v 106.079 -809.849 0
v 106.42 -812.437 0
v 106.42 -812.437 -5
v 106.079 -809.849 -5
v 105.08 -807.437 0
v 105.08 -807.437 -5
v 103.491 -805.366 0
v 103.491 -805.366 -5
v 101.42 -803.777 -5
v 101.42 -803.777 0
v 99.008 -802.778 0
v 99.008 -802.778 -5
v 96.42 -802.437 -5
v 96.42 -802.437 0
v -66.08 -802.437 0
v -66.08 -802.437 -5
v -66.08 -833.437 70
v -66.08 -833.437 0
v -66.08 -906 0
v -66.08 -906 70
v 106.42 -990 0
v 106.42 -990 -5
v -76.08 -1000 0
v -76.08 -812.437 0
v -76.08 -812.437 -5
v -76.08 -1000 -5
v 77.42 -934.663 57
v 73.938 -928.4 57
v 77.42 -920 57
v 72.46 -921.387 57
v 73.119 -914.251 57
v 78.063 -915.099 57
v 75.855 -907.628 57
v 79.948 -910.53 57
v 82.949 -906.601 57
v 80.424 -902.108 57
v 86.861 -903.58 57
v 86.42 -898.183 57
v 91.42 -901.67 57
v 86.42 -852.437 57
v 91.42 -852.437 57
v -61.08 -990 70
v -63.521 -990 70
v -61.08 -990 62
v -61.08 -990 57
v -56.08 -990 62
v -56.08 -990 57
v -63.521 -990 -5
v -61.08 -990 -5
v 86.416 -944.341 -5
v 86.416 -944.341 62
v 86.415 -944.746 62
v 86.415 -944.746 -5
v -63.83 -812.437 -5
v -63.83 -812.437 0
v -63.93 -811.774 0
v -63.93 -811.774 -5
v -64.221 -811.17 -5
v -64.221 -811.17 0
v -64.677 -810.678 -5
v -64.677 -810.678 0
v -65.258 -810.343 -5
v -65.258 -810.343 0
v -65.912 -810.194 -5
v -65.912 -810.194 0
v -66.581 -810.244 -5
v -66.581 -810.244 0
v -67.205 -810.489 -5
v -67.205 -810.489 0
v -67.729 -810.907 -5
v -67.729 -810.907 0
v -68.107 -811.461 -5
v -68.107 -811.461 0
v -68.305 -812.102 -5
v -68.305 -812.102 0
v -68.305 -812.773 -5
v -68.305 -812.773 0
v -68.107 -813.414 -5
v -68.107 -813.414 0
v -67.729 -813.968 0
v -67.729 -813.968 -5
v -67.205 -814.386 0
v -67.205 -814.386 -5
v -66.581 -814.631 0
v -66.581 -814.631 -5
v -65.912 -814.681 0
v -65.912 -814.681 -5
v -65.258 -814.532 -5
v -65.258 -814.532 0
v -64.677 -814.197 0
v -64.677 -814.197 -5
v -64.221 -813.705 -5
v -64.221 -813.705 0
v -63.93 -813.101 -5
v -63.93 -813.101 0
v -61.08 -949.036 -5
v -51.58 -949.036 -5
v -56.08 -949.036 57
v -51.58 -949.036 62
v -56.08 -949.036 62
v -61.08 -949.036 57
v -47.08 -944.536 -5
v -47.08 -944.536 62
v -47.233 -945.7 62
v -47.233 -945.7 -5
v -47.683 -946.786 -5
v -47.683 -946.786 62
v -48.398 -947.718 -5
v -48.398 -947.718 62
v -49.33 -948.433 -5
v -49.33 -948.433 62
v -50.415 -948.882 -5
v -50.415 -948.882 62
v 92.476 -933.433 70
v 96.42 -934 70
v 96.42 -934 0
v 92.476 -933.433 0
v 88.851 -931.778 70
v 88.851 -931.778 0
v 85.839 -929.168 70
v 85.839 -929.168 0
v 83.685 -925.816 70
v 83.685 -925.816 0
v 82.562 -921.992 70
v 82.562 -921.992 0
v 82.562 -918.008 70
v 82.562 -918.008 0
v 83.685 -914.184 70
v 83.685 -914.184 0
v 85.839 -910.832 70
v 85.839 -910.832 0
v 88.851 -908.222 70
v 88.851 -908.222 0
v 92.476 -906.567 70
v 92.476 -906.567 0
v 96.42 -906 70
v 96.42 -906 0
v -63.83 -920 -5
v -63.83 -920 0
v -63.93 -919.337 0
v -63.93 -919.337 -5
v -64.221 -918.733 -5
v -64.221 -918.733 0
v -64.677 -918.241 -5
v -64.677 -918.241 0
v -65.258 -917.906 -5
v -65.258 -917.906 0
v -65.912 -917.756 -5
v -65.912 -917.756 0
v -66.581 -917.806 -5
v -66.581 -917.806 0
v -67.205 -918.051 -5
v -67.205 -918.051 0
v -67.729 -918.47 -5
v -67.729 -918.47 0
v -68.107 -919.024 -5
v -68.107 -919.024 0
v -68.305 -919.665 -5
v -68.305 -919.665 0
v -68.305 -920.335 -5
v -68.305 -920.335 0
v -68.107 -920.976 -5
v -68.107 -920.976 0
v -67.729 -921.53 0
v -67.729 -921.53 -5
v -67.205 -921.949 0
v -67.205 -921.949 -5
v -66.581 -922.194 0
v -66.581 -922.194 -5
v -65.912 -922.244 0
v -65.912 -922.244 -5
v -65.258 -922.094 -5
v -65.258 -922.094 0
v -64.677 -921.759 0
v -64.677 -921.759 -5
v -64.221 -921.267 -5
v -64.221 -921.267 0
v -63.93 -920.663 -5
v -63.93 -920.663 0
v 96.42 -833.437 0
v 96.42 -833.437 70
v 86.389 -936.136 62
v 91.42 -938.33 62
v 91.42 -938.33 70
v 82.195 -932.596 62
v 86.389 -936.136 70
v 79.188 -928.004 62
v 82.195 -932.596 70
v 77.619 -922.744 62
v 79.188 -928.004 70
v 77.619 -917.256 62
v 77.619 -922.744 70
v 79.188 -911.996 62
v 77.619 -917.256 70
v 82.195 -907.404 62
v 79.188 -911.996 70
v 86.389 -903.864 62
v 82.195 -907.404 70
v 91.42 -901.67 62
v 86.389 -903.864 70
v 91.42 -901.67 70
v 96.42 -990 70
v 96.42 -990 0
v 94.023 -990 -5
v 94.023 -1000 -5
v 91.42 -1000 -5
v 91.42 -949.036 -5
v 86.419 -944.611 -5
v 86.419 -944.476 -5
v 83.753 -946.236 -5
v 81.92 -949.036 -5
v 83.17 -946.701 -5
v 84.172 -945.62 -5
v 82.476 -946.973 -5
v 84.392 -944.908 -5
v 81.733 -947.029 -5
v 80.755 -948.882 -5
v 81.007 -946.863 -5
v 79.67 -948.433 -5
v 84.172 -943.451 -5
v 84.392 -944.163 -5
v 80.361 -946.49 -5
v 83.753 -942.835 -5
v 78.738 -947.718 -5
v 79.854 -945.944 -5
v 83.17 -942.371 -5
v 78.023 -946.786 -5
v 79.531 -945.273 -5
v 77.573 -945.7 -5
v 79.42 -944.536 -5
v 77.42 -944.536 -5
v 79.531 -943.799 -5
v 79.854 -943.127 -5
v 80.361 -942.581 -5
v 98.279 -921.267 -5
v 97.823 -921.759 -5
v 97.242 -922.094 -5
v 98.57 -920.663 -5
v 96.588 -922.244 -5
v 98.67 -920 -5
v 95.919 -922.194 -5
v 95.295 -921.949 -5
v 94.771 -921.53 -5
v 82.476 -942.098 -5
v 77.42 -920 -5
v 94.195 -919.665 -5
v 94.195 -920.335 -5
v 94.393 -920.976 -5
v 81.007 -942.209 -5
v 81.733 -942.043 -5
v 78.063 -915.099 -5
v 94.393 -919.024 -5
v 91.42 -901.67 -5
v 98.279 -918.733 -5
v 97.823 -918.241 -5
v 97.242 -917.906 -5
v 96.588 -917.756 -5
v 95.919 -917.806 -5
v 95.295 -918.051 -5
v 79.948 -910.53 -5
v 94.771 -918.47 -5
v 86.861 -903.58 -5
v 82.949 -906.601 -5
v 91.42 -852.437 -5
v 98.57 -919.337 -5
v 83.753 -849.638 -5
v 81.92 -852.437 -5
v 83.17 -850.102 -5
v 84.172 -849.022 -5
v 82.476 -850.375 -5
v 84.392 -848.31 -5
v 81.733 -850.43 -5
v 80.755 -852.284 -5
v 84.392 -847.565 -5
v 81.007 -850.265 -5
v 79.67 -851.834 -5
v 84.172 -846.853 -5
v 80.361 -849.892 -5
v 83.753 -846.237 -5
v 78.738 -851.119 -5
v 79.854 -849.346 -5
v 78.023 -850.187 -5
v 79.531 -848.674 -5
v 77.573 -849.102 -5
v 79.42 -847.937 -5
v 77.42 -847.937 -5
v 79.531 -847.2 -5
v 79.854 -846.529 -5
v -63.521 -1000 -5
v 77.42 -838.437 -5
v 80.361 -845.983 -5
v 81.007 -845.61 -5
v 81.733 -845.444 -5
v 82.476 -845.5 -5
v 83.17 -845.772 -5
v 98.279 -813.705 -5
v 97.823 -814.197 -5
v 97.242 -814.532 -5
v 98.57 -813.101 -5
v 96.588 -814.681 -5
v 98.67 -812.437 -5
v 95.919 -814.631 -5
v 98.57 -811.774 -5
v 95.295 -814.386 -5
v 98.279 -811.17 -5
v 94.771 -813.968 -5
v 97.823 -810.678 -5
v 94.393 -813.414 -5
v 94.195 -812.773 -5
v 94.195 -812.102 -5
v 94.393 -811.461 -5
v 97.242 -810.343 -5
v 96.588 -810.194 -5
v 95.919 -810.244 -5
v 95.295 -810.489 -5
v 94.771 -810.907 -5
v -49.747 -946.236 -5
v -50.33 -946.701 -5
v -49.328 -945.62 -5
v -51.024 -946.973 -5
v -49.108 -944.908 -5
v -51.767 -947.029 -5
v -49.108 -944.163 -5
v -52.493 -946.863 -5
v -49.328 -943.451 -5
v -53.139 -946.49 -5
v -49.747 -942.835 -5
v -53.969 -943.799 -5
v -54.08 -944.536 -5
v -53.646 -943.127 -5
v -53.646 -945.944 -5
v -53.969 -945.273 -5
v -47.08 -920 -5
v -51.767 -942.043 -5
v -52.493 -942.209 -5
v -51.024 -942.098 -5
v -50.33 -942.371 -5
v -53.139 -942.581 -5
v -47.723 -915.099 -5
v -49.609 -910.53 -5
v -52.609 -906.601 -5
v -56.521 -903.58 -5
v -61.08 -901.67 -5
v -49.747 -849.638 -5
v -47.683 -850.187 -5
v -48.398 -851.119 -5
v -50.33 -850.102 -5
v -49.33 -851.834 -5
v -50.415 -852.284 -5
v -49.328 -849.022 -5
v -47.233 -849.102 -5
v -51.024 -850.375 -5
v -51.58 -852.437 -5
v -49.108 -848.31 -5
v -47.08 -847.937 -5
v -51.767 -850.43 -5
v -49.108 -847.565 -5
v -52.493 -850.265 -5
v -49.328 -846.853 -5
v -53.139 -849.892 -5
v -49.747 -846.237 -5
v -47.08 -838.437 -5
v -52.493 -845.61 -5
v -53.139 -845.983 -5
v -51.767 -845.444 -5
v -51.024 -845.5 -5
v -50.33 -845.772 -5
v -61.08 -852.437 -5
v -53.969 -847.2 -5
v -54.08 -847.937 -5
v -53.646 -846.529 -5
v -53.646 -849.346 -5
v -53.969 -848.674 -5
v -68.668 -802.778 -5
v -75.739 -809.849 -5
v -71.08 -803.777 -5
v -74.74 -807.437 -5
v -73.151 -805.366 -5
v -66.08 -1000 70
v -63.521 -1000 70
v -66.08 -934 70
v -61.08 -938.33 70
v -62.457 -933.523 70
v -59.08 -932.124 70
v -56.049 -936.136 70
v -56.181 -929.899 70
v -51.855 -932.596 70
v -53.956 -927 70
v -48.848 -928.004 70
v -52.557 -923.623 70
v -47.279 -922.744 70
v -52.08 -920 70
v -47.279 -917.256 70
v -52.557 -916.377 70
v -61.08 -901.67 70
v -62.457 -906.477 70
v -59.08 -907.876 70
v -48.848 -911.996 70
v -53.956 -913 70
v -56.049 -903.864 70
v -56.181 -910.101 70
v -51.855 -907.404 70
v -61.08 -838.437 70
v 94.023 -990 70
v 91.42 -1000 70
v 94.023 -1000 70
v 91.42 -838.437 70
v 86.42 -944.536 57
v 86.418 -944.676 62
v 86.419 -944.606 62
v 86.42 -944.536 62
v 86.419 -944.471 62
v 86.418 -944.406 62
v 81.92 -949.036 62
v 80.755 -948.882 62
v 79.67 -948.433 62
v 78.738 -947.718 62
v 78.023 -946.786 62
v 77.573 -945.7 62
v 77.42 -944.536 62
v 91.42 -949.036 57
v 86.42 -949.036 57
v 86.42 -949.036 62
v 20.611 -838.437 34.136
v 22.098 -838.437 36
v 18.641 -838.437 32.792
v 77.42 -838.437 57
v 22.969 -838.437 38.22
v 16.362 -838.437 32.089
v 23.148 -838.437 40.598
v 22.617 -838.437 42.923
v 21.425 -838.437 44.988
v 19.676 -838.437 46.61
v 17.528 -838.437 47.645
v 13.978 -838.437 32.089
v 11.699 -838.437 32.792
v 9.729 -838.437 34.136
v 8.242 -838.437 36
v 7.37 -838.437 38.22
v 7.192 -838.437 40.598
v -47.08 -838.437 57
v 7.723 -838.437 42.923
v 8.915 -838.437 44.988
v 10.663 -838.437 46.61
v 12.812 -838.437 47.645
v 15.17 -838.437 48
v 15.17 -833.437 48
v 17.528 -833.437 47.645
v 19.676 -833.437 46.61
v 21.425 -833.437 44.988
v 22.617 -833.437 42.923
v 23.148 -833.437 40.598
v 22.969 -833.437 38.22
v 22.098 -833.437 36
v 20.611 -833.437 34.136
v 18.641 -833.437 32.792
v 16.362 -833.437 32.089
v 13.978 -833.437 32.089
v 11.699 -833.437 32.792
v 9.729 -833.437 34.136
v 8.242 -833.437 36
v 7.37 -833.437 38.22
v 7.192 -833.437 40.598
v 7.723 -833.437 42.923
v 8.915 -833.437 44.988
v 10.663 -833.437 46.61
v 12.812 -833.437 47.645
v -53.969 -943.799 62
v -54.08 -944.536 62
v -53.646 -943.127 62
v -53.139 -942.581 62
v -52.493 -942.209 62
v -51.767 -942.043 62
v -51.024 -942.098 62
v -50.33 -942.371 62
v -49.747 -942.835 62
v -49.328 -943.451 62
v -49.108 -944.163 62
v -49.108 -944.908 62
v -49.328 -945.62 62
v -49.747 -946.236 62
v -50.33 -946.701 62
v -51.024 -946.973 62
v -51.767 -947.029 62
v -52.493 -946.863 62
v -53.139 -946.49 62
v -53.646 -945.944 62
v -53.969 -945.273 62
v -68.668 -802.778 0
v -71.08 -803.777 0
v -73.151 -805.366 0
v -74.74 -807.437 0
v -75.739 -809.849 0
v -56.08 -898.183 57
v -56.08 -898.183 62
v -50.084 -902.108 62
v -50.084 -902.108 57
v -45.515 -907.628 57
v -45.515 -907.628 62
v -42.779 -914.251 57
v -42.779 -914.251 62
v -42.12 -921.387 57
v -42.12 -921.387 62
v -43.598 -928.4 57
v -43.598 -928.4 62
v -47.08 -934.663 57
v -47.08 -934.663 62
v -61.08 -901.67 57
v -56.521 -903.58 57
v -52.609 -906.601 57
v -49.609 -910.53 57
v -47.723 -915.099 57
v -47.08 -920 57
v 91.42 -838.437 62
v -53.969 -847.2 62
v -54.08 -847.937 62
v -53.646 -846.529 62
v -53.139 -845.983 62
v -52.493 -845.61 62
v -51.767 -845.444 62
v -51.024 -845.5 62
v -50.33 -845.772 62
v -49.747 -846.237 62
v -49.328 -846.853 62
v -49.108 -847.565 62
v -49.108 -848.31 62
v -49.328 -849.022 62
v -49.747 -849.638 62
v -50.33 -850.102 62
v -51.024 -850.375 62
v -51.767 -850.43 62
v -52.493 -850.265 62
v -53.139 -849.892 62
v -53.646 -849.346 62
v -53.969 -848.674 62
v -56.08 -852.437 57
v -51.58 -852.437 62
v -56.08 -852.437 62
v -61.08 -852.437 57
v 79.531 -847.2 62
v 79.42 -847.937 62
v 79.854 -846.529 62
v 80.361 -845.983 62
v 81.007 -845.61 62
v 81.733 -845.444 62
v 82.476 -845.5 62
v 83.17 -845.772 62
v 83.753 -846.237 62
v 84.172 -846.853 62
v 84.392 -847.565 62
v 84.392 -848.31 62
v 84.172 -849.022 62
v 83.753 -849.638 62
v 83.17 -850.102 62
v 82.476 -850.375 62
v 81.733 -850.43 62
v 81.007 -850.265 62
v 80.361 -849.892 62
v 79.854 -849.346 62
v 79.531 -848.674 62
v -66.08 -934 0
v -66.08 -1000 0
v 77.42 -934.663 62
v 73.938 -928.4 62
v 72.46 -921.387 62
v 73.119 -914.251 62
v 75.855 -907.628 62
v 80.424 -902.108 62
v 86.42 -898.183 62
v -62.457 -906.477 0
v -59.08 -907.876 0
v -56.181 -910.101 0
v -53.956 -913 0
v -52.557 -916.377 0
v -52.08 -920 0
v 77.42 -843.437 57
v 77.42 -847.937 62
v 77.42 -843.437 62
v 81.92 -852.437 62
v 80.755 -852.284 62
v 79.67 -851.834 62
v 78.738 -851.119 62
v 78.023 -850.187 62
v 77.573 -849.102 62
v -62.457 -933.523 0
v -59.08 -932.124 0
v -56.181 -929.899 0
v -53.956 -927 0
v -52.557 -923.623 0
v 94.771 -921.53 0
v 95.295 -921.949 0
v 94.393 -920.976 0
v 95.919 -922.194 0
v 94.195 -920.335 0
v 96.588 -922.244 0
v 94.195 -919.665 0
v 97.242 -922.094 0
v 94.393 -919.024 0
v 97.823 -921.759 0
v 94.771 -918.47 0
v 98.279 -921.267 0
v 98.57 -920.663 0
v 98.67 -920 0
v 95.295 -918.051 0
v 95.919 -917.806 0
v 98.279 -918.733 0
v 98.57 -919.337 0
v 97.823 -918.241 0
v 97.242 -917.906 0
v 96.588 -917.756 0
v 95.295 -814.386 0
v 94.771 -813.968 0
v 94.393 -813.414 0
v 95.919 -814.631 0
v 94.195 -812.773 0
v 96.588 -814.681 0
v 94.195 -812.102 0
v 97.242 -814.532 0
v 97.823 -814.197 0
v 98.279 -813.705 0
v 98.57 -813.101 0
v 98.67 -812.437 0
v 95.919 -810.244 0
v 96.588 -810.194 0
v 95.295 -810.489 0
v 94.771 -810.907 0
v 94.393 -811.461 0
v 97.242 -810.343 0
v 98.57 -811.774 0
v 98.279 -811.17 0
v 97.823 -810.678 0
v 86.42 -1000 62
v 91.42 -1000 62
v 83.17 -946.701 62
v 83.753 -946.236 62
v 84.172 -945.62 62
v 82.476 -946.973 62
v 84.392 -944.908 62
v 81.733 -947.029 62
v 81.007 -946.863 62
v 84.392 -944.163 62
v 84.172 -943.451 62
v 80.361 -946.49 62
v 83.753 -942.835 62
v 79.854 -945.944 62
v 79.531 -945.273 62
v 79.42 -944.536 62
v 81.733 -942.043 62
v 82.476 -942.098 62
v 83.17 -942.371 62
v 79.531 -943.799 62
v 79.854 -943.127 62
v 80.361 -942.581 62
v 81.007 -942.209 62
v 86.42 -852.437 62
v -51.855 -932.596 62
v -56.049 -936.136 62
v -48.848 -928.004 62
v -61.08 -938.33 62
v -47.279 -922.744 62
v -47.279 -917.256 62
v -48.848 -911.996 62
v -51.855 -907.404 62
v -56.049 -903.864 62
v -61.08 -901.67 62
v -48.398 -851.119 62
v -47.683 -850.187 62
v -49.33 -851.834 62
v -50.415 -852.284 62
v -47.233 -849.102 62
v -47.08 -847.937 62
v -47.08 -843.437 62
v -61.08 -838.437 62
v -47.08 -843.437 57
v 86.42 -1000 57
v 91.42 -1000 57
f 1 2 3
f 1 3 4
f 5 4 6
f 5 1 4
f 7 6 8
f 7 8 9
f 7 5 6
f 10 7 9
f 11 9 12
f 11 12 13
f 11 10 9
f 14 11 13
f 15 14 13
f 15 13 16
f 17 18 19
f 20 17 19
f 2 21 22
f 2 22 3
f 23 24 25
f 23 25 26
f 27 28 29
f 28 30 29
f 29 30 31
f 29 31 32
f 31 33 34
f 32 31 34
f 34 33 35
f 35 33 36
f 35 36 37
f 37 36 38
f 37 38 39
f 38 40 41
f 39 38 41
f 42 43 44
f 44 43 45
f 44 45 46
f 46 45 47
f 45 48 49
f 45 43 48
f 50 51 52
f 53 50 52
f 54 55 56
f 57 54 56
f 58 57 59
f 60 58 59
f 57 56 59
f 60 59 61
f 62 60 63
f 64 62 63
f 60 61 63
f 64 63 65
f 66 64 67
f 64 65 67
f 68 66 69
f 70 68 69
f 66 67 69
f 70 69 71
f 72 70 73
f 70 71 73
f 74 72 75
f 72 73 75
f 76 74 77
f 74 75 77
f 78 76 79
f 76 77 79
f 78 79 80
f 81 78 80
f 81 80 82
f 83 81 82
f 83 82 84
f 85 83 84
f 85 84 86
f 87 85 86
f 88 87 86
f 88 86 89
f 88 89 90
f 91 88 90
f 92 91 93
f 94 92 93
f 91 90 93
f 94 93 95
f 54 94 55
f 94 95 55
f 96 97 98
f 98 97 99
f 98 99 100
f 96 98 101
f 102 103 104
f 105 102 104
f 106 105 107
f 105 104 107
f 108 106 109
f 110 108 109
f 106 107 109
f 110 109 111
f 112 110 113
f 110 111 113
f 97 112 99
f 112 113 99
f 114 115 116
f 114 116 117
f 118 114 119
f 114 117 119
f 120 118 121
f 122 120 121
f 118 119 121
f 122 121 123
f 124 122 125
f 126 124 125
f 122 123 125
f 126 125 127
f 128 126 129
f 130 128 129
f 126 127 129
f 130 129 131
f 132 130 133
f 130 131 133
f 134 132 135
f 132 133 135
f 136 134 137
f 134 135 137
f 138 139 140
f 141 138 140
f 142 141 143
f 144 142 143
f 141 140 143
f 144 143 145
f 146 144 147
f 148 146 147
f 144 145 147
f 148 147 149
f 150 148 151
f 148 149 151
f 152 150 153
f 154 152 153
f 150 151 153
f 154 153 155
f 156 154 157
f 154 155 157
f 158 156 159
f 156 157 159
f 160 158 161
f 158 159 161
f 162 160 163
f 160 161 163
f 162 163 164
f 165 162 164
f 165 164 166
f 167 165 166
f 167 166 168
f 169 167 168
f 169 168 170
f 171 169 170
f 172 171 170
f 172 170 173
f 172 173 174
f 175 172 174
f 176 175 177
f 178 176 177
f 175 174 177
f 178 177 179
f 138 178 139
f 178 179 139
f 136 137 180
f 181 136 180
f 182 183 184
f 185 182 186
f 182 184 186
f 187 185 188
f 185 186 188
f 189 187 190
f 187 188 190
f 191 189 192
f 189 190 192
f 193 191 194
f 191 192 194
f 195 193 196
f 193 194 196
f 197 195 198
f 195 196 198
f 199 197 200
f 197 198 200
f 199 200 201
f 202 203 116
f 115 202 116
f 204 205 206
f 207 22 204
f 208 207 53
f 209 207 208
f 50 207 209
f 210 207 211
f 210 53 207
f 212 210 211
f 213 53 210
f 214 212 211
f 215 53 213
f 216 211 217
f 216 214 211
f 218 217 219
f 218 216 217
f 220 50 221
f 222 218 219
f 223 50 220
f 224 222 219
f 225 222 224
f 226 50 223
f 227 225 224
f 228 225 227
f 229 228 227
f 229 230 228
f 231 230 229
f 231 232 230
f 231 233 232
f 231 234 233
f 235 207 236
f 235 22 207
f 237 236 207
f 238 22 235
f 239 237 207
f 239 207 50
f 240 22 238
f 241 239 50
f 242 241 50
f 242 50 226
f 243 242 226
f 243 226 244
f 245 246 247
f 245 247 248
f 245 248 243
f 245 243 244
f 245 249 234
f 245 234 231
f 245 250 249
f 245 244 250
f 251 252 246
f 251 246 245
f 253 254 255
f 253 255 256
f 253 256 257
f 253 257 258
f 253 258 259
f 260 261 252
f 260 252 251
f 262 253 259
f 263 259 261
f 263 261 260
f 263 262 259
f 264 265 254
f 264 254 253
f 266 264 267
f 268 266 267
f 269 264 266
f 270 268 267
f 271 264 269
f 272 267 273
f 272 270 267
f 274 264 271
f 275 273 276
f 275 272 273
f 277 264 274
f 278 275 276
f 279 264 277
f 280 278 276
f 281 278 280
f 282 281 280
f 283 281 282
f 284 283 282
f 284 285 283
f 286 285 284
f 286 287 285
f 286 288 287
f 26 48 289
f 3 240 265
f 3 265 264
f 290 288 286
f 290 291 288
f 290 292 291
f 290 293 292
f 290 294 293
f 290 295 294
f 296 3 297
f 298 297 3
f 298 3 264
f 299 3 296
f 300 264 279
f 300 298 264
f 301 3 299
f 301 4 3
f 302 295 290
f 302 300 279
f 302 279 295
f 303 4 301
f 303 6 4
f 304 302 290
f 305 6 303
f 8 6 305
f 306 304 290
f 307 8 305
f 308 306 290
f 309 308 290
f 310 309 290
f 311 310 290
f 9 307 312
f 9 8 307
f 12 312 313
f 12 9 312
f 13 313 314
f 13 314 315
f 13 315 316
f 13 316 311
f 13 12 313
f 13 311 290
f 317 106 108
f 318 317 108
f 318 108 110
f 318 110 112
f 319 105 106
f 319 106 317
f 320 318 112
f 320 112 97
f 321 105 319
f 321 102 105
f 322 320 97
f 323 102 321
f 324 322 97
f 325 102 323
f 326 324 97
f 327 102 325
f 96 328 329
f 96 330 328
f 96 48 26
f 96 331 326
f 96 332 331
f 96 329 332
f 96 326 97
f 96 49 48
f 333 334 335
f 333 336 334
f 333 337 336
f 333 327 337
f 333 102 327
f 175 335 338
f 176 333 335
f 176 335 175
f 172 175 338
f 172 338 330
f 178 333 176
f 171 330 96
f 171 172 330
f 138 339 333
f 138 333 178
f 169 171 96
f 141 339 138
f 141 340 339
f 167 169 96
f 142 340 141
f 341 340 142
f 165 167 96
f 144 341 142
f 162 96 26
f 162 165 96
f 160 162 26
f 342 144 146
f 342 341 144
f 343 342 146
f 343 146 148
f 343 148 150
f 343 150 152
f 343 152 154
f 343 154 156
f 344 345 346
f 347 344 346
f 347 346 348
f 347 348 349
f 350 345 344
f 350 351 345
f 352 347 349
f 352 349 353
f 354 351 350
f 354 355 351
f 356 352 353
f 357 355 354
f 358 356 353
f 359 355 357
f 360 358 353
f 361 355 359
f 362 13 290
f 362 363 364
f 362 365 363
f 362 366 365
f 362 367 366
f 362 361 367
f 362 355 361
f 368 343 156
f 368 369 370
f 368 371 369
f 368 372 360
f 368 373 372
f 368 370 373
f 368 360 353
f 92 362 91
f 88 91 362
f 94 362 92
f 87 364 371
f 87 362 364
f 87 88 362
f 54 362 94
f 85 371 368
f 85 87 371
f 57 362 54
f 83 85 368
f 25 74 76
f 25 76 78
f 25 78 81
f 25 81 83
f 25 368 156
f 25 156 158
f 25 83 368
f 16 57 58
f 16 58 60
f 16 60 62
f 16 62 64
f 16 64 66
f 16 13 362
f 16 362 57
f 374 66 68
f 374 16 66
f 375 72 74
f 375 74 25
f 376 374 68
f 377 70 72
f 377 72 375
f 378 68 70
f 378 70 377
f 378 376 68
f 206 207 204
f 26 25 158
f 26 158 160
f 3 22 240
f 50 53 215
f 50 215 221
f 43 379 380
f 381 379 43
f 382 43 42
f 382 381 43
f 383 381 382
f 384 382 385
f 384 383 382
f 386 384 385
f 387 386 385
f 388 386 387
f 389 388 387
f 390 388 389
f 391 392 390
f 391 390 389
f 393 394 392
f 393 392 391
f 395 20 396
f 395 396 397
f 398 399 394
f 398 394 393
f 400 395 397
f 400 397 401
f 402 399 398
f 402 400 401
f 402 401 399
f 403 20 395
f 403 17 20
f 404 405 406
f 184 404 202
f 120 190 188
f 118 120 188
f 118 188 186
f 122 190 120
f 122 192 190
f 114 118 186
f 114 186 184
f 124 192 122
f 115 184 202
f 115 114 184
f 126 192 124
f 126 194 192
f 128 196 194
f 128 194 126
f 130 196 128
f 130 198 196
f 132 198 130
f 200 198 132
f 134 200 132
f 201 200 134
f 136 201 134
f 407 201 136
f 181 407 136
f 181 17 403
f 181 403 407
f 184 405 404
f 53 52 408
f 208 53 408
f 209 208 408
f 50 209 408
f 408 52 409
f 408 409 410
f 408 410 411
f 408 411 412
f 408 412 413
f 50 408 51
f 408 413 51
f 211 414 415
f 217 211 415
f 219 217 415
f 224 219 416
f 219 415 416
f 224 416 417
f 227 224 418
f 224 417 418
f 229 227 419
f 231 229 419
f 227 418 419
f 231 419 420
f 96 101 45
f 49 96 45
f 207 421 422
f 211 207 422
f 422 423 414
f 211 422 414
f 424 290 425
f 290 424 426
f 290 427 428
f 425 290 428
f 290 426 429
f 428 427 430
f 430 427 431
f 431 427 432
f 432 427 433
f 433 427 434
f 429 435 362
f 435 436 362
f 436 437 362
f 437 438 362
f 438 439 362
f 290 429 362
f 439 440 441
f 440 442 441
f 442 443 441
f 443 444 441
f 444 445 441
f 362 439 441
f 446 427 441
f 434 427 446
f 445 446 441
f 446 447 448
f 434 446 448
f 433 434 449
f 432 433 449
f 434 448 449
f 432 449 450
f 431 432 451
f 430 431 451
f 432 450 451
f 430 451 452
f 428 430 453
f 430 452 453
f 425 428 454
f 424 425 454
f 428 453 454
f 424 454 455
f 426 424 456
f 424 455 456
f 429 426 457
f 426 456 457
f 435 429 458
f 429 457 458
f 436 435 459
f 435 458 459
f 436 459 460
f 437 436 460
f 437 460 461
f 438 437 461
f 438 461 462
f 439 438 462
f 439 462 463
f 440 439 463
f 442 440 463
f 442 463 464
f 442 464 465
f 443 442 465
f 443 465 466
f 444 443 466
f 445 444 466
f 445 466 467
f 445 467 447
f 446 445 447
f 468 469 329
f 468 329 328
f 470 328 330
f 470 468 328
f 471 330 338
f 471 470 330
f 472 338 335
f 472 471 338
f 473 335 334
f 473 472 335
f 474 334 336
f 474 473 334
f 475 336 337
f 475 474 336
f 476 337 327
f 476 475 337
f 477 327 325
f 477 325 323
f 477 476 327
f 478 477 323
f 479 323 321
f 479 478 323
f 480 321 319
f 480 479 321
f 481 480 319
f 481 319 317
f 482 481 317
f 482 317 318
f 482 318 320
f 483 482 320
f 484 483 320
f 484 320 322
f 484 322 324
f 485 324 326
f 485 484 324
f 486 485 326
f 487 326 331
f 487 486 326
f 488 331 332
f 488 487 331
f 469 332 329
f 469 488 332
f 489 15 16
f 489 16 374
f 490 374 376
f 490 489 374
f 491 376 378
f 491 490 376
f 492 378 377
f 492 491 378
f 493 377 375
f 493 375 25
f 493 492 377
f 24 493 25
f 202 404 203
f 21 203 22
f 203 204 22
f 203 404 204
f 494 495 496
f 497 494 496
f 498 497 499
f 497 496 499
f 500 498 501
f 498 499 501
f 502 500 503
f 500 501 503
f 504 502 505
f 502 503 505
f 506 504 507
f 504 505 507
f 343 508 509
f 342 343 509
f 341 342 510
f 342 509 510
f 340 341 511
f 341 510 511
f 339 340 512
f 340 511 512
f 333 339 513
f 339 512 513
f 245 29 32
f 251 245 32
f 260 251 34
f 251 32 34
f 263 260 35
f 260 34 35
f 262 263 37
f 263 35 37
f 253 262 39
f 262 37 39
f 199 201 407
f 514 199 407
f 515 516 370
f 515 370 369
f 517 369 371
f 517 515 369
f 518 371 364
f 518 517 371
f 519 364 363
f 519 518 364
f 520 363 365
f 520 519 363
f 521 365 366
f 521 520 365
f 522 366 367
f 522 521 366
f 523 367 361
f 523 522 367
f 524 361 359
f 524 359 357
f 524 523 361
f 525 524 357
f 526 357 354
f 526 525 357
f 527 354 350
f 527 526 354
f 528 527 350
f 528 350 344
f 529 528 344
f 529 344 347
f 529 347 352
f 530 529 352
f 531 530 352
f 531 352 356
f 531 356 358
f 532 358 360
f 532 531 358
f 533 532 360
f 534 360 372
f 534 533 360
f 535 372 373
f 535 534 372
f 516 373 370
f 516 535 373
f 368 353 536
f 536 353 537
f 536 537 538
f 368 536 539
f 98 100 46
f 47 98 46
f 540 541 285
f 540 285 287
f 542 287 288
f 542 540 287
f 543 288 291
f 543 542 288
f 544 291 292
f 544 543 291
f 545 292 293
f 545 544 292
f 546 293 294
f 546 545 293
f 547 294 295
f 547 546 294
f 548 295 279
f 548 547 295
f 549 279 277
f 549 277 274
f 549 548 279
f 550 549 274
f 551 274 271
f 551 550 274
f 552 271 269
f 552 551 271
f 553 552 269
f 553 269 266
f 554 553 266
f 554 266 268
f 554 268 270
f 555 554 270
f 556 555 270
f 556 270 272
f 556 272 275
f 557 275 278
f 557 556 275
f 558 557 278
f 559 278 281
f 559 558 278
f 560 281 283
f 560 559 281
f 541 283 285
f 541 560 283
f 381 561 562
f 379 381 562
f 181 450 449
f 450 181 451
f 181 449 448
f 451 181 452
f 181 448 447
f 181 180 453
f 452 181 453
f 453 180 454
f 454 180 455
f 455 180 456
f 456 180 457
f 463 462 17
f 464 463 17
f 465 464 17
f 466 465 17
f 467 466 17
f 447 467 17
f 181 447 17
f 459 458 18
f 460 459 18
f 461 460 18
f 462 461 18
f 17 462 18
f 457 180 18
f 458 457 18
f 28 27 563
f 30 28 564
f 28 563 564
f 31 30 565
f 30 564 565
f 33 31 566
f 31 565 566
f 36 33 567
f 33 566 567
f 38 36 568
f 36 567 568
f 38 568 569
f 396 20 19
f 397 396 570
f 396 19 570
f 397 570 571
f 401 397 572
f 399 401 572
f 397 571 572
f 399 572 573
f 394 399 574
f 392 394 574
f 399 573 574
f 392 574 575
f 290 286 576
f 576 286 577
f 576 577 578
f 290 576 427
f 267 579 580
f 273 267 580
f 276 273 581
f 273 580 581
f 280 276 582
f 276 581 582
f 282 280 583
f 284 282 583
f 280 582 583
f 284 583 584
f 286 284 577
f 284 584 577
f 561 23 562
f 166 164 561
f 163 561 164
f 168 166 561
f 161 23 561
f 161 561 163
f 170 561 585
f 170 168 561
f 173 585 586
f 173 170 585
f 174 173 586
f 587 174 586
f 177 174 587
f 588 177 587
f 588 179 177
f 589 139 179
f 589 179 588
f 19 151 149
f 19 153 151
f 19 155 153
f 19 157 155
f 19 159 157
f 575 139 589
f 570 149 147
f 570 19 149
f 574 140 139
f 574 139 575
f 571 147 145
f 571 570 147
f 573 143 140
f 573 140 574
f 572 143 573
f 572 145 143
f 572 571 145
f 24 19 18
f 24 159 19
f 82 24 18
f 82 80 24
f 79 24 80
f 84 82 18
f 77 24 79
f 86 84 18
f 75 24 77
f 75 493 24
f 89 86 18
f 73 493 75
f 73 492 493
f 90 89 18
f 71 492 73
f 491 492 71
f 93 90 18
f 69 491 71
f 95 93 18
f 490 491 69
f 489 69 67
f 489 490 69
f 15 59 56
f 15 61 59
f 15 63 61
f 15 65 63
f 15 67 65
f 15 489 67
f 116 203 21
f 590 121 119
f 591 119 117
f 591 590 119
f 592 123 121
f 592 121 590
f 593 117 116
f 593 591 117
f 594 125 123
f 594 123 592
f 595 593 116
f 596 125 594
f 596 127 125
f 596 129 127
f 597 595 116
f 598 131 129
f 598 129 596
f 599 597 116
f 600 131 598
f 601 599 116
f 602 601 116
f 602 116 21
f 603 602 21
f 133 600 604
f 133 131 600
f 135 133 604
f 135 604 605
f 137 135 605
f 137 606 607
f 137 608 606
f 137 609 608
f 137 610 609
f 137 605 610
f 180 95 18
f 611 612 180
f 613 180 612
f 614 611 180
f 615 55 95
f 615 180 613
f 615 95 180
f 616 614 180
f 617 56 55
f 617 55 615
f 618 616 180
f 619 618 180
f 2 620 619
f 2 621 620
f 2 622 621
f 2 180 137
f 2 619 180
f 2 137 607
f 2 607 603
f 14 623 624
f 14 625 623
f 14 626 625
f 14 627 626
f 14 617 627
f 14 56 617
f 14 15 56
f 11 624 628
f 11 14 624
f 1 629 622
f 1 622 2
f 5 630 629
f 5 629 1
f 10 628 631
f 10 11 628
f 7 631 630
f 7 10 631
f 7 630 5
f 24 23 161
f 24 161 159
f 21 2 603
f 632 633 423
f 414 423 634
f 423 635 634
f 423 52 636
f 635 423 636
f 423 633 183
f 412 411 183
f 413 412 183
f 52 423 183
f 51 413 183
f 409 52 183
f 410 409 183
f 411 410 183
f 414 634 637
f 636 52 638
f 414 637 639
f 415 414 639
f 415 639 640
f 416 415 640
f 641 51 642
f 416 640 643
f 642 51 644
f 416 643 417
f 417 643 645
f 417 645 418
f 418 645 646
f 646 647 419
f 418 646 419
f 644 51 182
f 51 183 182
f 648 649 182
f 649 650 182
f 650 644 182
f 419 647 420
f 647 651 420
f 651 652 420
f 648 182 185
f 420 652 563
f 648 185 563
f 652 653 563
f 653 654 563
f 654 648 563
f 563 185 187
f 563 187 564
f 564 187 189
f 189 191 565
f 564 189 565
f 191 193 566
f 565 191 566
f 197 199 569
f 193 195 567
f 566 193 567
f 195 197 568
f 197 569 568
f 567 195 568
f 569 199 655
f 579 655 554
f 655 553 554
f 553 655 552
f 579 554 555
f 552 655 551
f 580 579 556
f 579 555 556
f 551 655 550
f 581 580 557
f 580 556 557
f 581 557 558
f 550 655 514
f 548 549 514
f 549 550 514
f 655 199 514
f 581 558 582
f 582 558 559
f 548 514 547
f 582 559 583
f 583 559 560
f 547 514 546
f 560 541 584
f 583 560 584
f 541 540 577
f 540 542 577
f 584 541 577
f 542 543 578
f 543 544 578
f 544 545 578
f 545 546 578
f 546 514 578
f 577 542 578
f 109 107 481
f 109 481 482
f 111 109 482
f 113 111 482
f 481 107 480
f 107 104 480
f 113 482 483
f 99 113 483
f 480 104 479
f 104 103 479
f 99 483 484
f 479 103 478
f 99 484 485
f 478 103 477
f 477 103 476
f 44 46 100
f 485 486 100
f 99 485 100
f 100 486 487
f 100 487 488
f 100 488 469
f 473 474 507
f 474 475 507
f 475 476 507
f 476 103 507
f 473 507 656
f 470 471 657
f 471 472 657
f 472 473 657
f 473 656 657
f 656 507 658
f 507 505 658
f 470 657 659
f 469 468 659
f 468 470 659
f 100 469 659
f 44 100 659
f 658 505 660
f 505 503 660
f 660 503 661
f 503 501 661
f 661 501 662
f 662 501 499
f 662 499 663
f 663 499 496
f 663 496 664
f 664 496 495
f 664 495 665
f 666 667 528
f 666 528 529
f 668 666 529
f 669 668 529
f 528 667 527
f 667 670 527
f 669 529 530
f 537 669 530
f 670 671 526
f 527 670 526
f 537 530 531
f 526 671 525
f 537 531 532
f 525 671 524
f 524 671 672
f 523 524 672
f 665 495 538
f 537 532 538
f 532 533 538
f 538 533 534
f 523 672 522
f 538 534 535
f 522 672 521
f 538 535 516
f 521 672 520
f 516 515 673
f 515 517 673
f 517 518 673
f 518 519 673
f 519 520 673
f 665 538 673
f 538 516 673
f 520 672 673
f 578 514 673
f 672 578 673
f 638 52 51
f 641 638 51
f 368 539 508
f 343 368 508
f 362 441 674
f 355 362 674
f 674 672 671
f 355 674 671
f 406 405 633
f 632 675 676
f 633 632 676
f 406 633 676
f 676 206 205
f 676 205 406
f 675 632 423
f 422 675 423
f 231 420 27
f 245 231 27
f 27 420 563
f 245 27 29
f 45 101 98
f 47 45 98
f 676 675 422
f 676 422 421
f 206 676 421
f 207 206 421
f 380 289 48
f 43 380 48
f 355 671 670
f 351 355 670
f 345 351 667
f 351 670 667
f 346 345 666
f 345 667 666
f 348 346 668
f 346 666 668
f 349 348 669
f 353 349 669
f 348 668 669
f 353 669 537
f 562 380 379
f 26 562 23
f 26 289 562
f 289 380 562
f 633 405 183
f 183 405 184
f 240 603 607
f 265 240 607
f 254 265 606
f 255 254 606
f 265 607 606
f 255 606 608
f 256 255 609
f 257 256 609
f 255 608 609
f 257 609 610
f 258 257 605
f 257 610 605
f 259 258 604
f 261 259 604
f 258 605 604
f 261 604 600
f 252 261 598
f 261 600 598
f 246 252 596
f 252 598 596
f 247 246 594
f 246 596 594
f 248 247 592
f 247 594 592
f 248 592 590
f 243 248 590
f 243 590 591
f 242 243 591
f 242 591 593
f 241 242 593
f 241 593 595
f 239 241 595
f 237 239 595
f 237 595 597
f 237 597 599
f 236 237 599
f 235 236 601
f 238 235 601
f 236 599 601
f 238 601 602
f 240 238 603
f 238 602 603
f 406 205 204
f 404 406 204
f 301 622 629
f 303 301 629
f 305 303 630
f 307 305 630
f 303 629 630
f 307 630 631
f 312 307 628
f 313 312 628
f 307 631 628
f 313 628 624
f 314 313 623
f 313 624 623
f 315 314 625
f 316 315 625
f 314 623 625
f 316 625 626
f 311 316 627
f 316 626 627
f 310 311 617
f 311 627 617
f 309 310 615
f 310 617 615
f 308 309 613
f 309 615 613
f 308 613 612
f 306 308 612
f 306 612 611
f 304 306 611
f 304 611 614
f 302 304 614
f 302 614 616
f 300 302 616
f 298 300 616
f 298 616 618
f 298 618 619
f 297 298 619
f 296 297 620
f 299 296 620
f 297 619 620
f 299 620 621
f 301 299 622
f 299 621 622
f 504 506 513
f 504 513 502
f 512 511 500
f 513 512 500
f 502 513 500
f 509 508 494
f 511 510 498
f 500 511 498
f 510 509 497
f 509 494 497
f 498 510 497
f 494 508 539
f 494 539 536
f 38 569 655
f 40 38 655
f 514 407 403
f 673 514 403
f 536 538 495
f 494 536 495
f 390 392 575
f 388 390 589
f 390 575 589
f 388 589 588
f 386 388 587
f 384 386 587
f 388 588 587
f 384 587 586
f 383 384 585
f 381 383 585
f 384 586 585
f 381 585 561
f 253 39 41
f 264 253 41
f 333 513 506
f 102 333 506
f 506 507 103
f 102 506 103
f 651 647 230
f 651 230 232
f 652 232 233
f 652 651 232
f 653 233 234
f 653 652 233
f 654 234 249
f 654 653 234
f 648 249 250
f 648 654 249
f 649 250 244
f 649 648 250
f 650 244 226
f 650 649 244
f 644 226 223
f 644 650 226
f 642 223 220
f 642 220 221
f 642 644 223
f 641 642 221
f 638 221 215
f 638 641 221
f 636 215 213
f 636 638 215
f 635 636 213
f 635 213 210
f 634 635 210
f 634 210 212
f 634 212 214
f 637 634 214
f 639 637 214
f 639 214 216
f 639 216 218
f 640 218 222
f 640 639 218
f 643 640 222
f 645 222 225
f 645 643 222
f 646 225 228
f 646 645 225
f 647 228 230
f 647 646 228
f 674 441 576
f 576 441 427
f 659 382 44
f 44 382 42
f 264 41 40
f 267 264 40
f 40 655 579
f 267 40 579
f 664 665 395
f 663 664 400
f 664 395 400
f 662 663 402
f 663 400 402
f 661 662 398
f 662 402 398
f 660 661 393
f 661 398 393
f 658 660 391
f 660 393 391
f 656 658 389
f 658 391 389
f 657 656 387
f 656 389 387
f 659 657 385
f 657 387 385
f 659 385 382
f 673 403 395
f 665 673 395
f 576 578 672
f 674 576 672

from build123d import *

# Parameters (mm, degrees)
SKETCH1_R               = 2.25
SKETCH1_R_2             = 7.9375
BOSS_EXTRUDE1_DEPTH     = 5
BOSS_EXTRUDE2_DEPTH     = 70
SKETCH3_R               = 8
CUT_EXTRUDE1_DEPTH      = 391.651691136
CUT_EXTRUDE2_DEPTH      = 1209.654326614
SKETCH5_R               = 7.9375
CUT_EXTRUDE3_DEPTH      = 1209.654326614
BOSS_EXTRUDE4_DEPTH     = 5
BOSS_EXTRUDE5_START     = -67
BOSS_EXTRUDE5_OUTLINE_R = 2.5
BOSS_EXTRUDE5_DEPTH     = 67
CUT_EXTRUDE4_DEPTH      = 1209.654326614
CUT_EXTRUDE4_DEPTH_BACK = 1209.654326614
CUT_EXTRUDE5_DEPTH      = 1009.510065127


# Read off the part's stored shape, not the designer's step: Boss-Extrude5
with BuildPart() as part:
    # Sketch1 → Boss-Extrude1 (new body)
    with BuildSketch(Plane.XY):
        with BuildLine():
            Line((-66.080112923, -1201.56262), (96.419887077, -1201.56262))
            ThreePointArc((96.419887077, -1201.56262), (106.319382013, -1197.462114937), (110.419887077, -1187.56262))
            Line((110.419887077, -1187.56262), (110.419887077, -812.43738))
            ThreePointArc((110.419887077, -812.43738), (106.319382013, -802.537885063), (96.419887077, -798.43738))
            Line((96.419887077, -798.43738), (-66.080112923, -798.43738))
            ThreePointArc((-66.080112923, -798.43738), (-75.97960786, -802.537885063), (-80.080112923, -812.43738))
            Line((-80.080112923, -812.43738), (-80.080112923, -1187.56262))
            ThreePointArc((-80.080112923, -1187.56262), (-75.97960786, -1197.462114937), (-66.080112923, -1201.56262))
        make_face()
        with Locations((96.419887077, -1080)):
            Circle(SKETCH1_R, mode=Mode.SUBTRACT)
        with Locations((88.147808187, -1029.0799835)):
            Circle(SKETCH1_R_2, mode=Mode.SUBTRACT)
        with Locations((-66.080112923, -1080)):
            Circle(SKETCH1_R, mode=Mode.SUBTRACT)
        with Locations((96.419887077, -920)):
            Circle(SKETCH1_R, mode=Mode.SUBTRACT)
        with Locations((-66.080112923, -920)):
            Circle(SKETCH1_R, mode=Mode.SUBTRACT)
        with Locations((-66.080112923, -1187.56262)):
            Circle(SKETCH1_R, mode=Mode.SUBTRACT)
        with Locations((96.419887077, -1187.56262)):
            Circle(SKETCH1_R, mode=Mode.SUBTRACT)
        with Locations((-66.080112923, -812.43738)):
            Circle(SKETCH1_R, mode=Mode.SUBTRACT)
        with Locations((96.419887077, -812.43738)):
            Circle(SKETCH1_R, mode=Mode.SUBTRACT)
    extrude(amount=-BOSS_EXTRUDE1_DEPTH)

    # Sketch2 → Boss-Extrude2 (add)
    with BuildSketch(Plane.XY):
        with BuildLine():
            Line((91.419887077, -1166.56262), (96.419887077, -1166.56262))
            Line((96.419887077, -1166.56262), (96.419887077, -1099))
            Line((96.419887077, -1099), (96.419887077, -1094))
            ThreePointArc((96.419887077, -1094), (82.419887077, -1080), (96.419887077, -1066))
            Line((96.419887077, -1066), (96.419887077, -1061))
            Line((96.419887077, -1061), (96.419887077, -1044.996221029))
            ThreePointArc((96.419887077, -1044.996221029), (106.085308187, -1029.0799835), (96.419887077, -1013.163745971))
            Line((96.419887077, -1013.163745971), (96.419887077, -939))
            Line((96.419887077, -939), (96.419887077, -934))
            ThreePointArc((96.419887077, -934), (82.419887077, -920), (96.419887077, -906))
            Line((96.419887077, -906), (96.419887077, -901))
            Line((96.419887077, -901), (96.419887077, -833.43738))
            Line((96.419887077, -833.43738), (91.419887077, -833.43738))
            Line((91.419887077, -833.43738), (-61.080112923, -833.43738))
            Line((-61.080112923, -833.43738), (-66.080112923, -833.43738))
            Line((-66.080112923, -833.43738), (-66.080112923, -901))
            Line((-66.080112923, -901), (-66.080112923, -906))
            ThreePointArc((-66.080112923, -906), (-56.180617987, -910.100505063), (-52.080112923, -920))
            ThreePointArc((-52.080112923, -920), (-56.180617987, -929.899494937), (-66.080112923, -934))
            Line((-66.080112923, -934), (-66.080112923, -939))
            Line((-66.080112923, -939), (-66.080112923, -1061))
            Line((-66.080112923, -1061), (-66.080112923, -1066))
            ThreePointArc((-66.080112923, -1066), (-56.180617987, -1070.100505063), (-52.080112923, -1080))
            ThreePointArc((-52.080112923, -1080), (-56.180617987, -1089.899494937), (-66.080112923, -1094))
            Line((-66.080112923, -1094), (-66.080112923, -1099))
            Line((-66.080112923, -1099), (-66.080112923, -1166.56262))
            Line((-66.080112923, -1166.56262), (-61.080112923, -1166.56262))
            Line((-61.080112923, -1166.56262), (91.419887077, -1166.56262))
        make_face()
        with BuildLine():
            Line((91.419887077, -1098.33030278), (91.419887077, -1161.56262))
            Line((91.419887077, -1161.56262), (-61.080112923, -1161.56262))
            Line((-61.080112923, -1161.56262), (-61.080112923, -1098.33030278))
            ThreePointArc((-61.080112923, -1098.33030278), (-47.080112923, -1080), (-61.080112923, -1061.66969722))
            Line((-61.080112923, -1061.66969722), (-61.080112923, -938.33030278))
            ThreePointArc((-61.080112923, -938.33030278), (-47.080112923, -920), (-61.080112923, -901.66969722))
            Line((-61.080112923, -901.66969722), (-61.080112923, -838.43738))
            Line((-61.080112923, -838.43738), (91.419887077, -838.43738))
            Line((91.419887077, -838.43738), (91.419887077, -901.66969722))
            ThreePointArc((91.419887077, -901.66969722), (77.419887077, -920), (91.419887077, -938.33030278))
            Line((91.419887077, -938.33030278), (91.419887077, -1011.443447389))
            Line((91.419887077, -1011.443447389), (91.419887077, -1016.563098664))
            ThreePointArc((91.419887077, -1016.563098664), (94.061132369, -1017.572963757), (96.419887077, -1019.132540759))
            ThreePointArc((96.419887077, -1019.132540759), (99.861025654, -1023.586401535), (101.085308187, -1029.0799835))
            ThreePointArc((101.085308187, -1029.0799835), (99.861025654, -1034.573565465), (96.419887077, -1039.027426241))
            ThreePointArc((96.419887077, -1039.027426241), (94.061132369, -1040.587003243), (91.419887077, -1041.596868336))
            Line((91.419887077, -1041.596868336), (91.419887077, -1046.716519611))
            Line((91.419887077, -1046.716519611), (91.419887077, -1061.66969722))
            ThreePointArc((91.419887077, -1061.66969722), (77.419887077, -1080), (91.419887077, -1098.33030278))
        make_face(mode=Mode.SUBTRACT)
    extrude(amount=BOSS_EXTRUDE2_DEPTH)

    # Sketch3 → Cut-Extrude1 (cut, through all)
    with BuildSketch(Plane(origin=(0, -833.43738, 0), x_dir=(1, 0, 0), z_dir=(0, 1, 0))):
        with Locations(Location((15.169887077, -40, 0), (0, 0, 270))):
            Circle(SKETCH3_R)
    extrude(amount=-CUT_EXTRUDE1_DEPTH, mode=Mode.SUBTRACT)

    # Sketch4 → Cut-Extrude2 (cut, through all)
    with BuildSketch(Plane.XY):
        with BuildLine():
            Line((-61.080112923, -1161.56262), (91.419887077, -1161.56262))
            Line((91.419887077, -1161.56262), (91.419887077, -1098.33030278))
            ThreePointArc((91.419887077, -1098.33030278), (77.419887077, -1080), (91.419887077, -1061.66969722))
            Line((91.419887077, -1061.66969722), (91.419887077, -1046.716519611))
            ThreePointArc((91.419887077, -1046.716519611), (70.210308187, -1029.0799835), (91.419887077, -1011.443447389))
            Line((91.419887077, -1011.443447389), (91.419887077, -938.33030278))
            ThreePointArc((91.419887077, -938.33030278), (77.419887077, -920), (91.419887077, -901.66969722))
            Line((91.419887077, -901.66969722), (91.419887077, -838.43738))
            Line((91.419887077, -838.43738), (-61.080112923, -838.43738))
            Line((-61.080112923, -838.43738), (-61.080112923, -901.66969722))
            ThreePointArc((-61.080112923, -901.66969722), (-47.080112923, -920), (-61.080112923, -938.33030278))
            Line((-61.080112923, -938.33030278), (-61.080112923, -1061.66969722))
            ThreePointArc((-61.080112923, -1061.66969722), (-47.080112923, -1080), (-61.080112923, -1098.33030278))
            Line((-61.080112923, -1098.33030278), (-61.080112923, -1161.56262))
        make_face()
    extrude(amount=-CUT_EXTRUDE2_DEPTH, mode=Mode.SUBTRACT)

    # Sketch5 → Cut-Extrude3 (cut, through all)
    # profile 1 of 2: a face of its own
    with BuildSketch(Plane.XY):
        with BuildLine():
            ThreePointArc((101.085308187, -1029.0799835), (98.387716069, -1021.172822644), (91.419887077, -1016.563098664))
            ThreePointArc((91.419887077, -1016.563098664), (75.210308187, -1029.0799835), (91.419887077, -1041.596868336))
            ThreePointArc((91.419887077, -1041.596868336), (98.387716069, -1036.987144356), (101.085308187, -1029.0799835))
        make_face()
        with Locations((88.147808187, -1029.0799835)):
            Circle(SKETCH5_R, mode=Mode.SUBTRACT)
    # profile 2 of 2: a face of its own
    with BuildSketch(Plane.XY):
        with BuildLine():
            Line((91.419887077, -1016.563098664), (91.419887077, -1011.443447389))
            ThreePointArc((91.419887077, -1011.443447389), (70.210308187, -1029.0799835), (91.419887077, -1046.716519611))
            Line((91.419887077, -1046.716519611), (91.419887077, -1041.596868336))
            ThreePointArc((91.419887077, -1041.596868336), (75.210308187, -1029.0799835), (91.419887077, -1016.563098664))
        make_face()
    extrude(amount=-CUT_EXTRUDE3_DEPTH, mode=Mode.SUBTRACT)

    # Sketch9 → Boss-Extrude4 (add)
    with BuildSketch(Plane.XY.offset(62)):
        with BuildLine():
            Line((-61.080112923, -1098.33030278), (-61.080112923, -1161.56262))
            Line((-61.080112923, -1161.56262), (91.419887077, -1161.56262))
            Line((91.419887077, -1161.56262), (91.419887077, -1098.33030278))
            ThreePointArc((91.419887077, -1098.33030278), (77.419887077, -1080), (91.419887077, -1061.66969722))
            Line((91.419887077, -1061.66969722), (91.419887077, -1041.596868336))
            ThreePointArc((91.419887077, -1041.596868336), (101.085308187, -1029.0799835), (91.419887077, -1016.563098664))
            Line((91.419887077, -1016.563098664), (91.419887077, -938.33030278))
            ThreePointArc((91.419887077, -938.33030278), (77.419887077, -920), (91.419887077, -901.66969722))
            Line((91.419887077, -901.66969722), (91.419887077, -838.43738))
            Line((91.419887077, -838.43738), (-61.080112923, -838.43738))
            Line((-61.080112923, -838.43738), (-61.080112923, -901.66969722))
            ThreePointArc((-61.080112923, -901.66969722), (-47.080112923, -920), (-61.080112923, -938.33030278))
            Line((-61.080112923, -938.33030278), (-61.080112923, -1061.66969722))
            ThreePointArc((-61.080112923, -1061.66969722), (-47.080112923, -1080), (-61.080112923, -1098.33030278))
        make_face()
        with BuildLine():
            Line((86.419887077, -843.43738), (-56.080112923, -843.43738))
            Line((-56.080112923, -843.43738), (-56.080112923, -898.182575771))
            ThreePointArc((-56.080112923, -898.182575771), (-42.080112923, -920), (-56.080112923, -941.817424229))
            Line((-56.080112923, -941.817424229), (-56.080112923, -1058.182575771))
            ThreePointArc((-56.080112923, -1058.182575771), (-42.080112923, -1080), (-56.080112923, -1101.817424229))
            Line((-56.080112923, -1101.817424229), (-56.080112923, -1156.56262))
            Line((-56.080112923, -1156.56262), (86.419887077, -1156.56262))
            Line((86.419887077, -1156.56262), (86.419887077, -1101.817424229))
            ThreePointArc((86.419887077, -1101.817424229), (72.419887077, -1080), (86.419887077, -1058.182575771))
            Line((86.419887077, -1058.182575771), (86.419887077, -1036.827124578))
            ThreePointArc((86.419887077, -1036.827124578), (96.085308187, -1029.0799835), (86.419887077, -1021.332842422))
            Line((86.419887077, -1021.332842422), (86.419887077, -941.817424229))
            ThreePointArc((86.419887077, -941.817424229), (72.419887077, -920), (86.419887077, -898.182575771))
            Line((86.419887077, -898.182575771), (86.419887077, -843.43738))
        make_face(mode=Mode.SUBTRACT)
    extrude(amount=-BOSS_EXTRUDE4_DEPTH)

    # Boss-Extrude5 outline → Boss-Extrude5 (add)
    # profile 1 of 8: a face of its own
    with BuildSketch(Plane(origin=(0, 0, -5), x_dir=(-1, 0, 0), z_dir=(0, 0, -1)).offset(BOSS_EXTRUDE5_START)):
        with BuildLine():
            ThreePointArc((-77.419887077, -1152.06262), (-78.737906562, -1148.880639485), (-81.919887077, -1147.56262))
            Line((-81.919887077, -1147.56262), (-91.419887077, -1147.56262))
            Line((-91.419887077, -1147.56262), (-91.419887077, -1161.56262))
            Line((-91.419887077, -1161.56262), (-77.419887077, -1161.56262))
            Line((-77.419887077, -1161.56262), (-77.419887077, -1152.06262))
        make_face()
        with Locations((-81.919887077, -1152.06262)):
            Circle(BOSS_EXTRUDE5_OUTLINE_R, mode=Mode.SUBTRACT)
    # profile 2 of 8: a face of its own
    with BuildSketch(Plane(origin=(0, 0, -5), x_dir=(-1, 0, 0), z_dir=(0, 0, -1)).offset(BOSS_EXTRUDE5_START)):
        with BuildLine():
            Line((-81.919887077, -1050.964311707), (-91.419887077, -1050.964311707))
            Line((-91.419887077, -1050.964311707), (-91.419887077, -1061.66969722))
            ThreePointArc((-91.419887077, -1061.66969722), (-81.320218206, -1068.467437405), (-77.419887077, -1080))
            Line((-77.419887077, -1080), (-77.419887077, -1055.464311707))
            ThreePointArc((-77.419887077, -1055.464311707), (-78.737906561, -1052.282331191), (-81.919887077, -1050.964311707))
        make_face()
        with Locations((-81.919887077, -1055.464311707)):
            Circle(BOSS_EXTRUDE5_OUTLINE_R, mode=Mode.SUBTRACT)
    # profile 3 of 8: a face of its own
    with BuildSketch(Plane(origin=(0, 0, -5), x_dir=(-1, 0, 0), z_dir=(0, 0, -1)).offset(BOSS_EXTRUDE5_START)):
        with BuildLine():
            Line((61.080112923, -1147.56262), (51.580112923, -1147.56262))
            ThreePointArc((51.580112923, -1147.56262), (48.398132408, -1148.880639485), (47.080112923, -1152.06262))
            Line((47.080112923, -1152.06262), (47.080112923, -1161.56262))
            Line((47.080112923, -1161.56262), (61.080112923, -1161.56262))
            Line((61.080112923, -1161.56262), (61.080112923, -1147.56262))
        make_face()
        with Locations((51.580112923, -1152.06262)):
            Circle(BOSS_EXTRUDE5_OUTLINE_R, mode=Mode.SUBTRACT)
    # profile 4 of 8: a face of its own
    with BuildSketch(Plane(origin=(0, 0, -5), x_dir=(-1, 0, 0), z_dir=(0, 0, -1)).offset(BOSS_EXTRUDE5_START)):
        with BuildLine():
            Line((61.080112923, -1050.964311707), (51.580112923, -1050.964311707))
            ThreePointArc((51.580112923, -1050.964311707), (48.398132408, -1052.282331192), (47.080112923, -1055.464311707))
            Line((47.080112923, -1055.464311707), (47.101209294, -1079.104892724))
            ThreePointArc((47.101209294, -1079.104892724), (51.256366252, -1068.114860765), (61.080112923, -1061.66969722))
            Line((61.080112923, -1061.66969722), (61.080112923, -1050.964311707))
        make_face()
        with Locations((51.580112923, -1055.464311707)):
            Circle(BOSS_EXTRUDE5_OUTLINE_R, mode=Mode.SUBTRACT)
    # profile 5 of 8: a face of its own
    with BuildSketch(Plane(origin=(0, 0, -5), x_dir=(-1, 0, 0), z_dir=(0, 0, -1)).offset(BOSS_EXTRUDE5_START)):
        with BuildLine():
            Line((47.080112923, -920), (47.080112923, -944.535688293))
            ThreePointArc((47.080112923, -944.535688293), (48.398132408, -947.717668808), (51.580112923, -949.035688293))
            Line((51.580112923, -949.035688293), (61.080112923, -949.035688293))
            Line((61.080112923, -949.035688293), (61.080112923, -938.33030278))
            ThreePointArc((61.080112923, -938.33030278), (50.980444052, -931.532562595), (47.080112923, -920))
        make_face()
        with Locations((51.580112923, -944.535688293)):
            Circle(BOSS_EXTRUDE5_OUTLINE_R, mode=Mode.SUBTRACT)
    # profile 6 of 8: a face of its own
    with BuildSketch(Plane(origin=(0, 0, -5), x_dir=(-1, 0, 0), z_dir=(0, 0, -1)).offset(BOSS_EXTRUDE5_START)):
        with BuildLine():
            Line((47.080112923, -838.43738), (47.080112923, -847.93738))
            ThreePointArc((47.080112923, -847.93738), (48.398132408, -851.119360515), (51.580112923, -852.43738))
            Line((51.580112923, -852.43738), (61.080112923, -852.43738))
            Line((61.080112923, -852.43738), (61.080112923, -838.43738))
            Line((61.080112923, -838.43738), (47.080112923, -838.43738))
        make_face()
        with Locations((51.580112923, -847.93738)):
            Circle(BOSS_EXTRUDE5_OUTLINE_R, mode=Mode.SUBTRACT)
    # profile 7 of 8: a face of its own
    with BuildSketch(Plane(origin=(0, 0, -5), x_dir=(-1, 0, 0), z_dir=(0, 0, -1)).offset(BOSS_EXTRUDE5_START)):
        with BuildLine():
            Line((-91.419887077, -852.43738), (-81.919887077, -852.43738))
            ThreePointArc((-81.919887077, -852.43738), (-78.737906561, -851.119360516), (-77.419887077, -847.93738))
            Line((-77.419887077, -847.93738), (-77.419887077, -838.43738))
            Line((-77.419887077, -838.43738), (-91.419887077, -838.43738))
            Line((-91.419887077, -838.43738), (-91.419887077, -852.43738))
        make_face()
        with Locations((-81.919887077, -847.93738)):
            Circle(BOSS_EXTRUDE5_OUTLINE_R, mode=Mode.SUBTRACT)
    # profile 8 of 8: a face of its own
    with BuildSketch(Plane(origin=(0, 0, -5), x_dir=(-1, 0, 0), z_dir=(0, 0, -1)).offset(BOSS_EXTRUDE5_START)):
        with BuildLine():
            Line((-91.419887077, -949.035688293), (-81.919887077, -949.035688293))
            ThreePointArc((-81.919887077, -949.035688293), (-78.737906562, -947.717668808), (-77.419887077, -944.535688293))
            Line((-77.419887077, -944.535688293), (-77.419887077, -920))
            ThreePointArc((-77.419887077, -920), (-81.320218206, -931.532562595), (-91.419887077, -938.33030278))
            Line((-91.419887077, -938.33030278), (-91.419887077, -949.035688293))
        make_face()
        with BuildLine():
            Line((-86.415652438, -944.340511931), (-86.414971961, -944.745954498))
            ThreePointArc((-86.414971961, -944.745954498), (-86.419880739, -944.543240882), (-86.415652438, -944.340511931))
        make_face(mode=Mode.SUBTRACT)
        with Locations((-81.919887077, -944.535688293)):
            Circle(BOSS_EXTRUDE5_OUTLINE_R, mode=Mode.SUBTRACT)
    extrude(amount=BOSS_EXTRUDE5_DEPTH)

    # Sketch13 → Cut-Extrude4 (cut, two sides: drawn at the far end of the back side and taken through both)
    with BuildSketch(Plane.XY.offset(-CUT_EXTRUDE4_DEPTH_BACK)):
        Polygon((94.023297062, -1000), (94.023297062, -990), (113.715152321, -990), (110.419887077, -1000), (180.991747424, -1022.37445391), (169.051741721, -1117.894499535), (178.766489059, -1320.824777271), (-54.387447063, -1291.680535255), (-189.224542066, -1144.69750743), (-91.869342688, -1000), (-66.080112923, -1000), (-63.520729079, -1000), (-63.520729079, -990), (82.322721203, -990), (82.322721203, -1000), align=None)
    extrude(amount=CUT_EXTRUDE4_DEPTH + CUT_EXTRUDE4_DEPTH_BACK, mode=Mode.SUBTRACT)

    # Sketch14 → Cut-Extrude5 (cut, through all)
    with BuildSketch(Plane.XY):
        with BuildLine():
            Line((-76.080112923, -1000), (-114.548207205, -1013.362990202))
            Line((-114.548207205, -1013.362990202), (-112.250375439, -756.771776282))
            Line((-112.250375439, -756.771776282), (134.000595533, -776.686318257))
            Line((134.000595533, -776.686318257), (134.000595533, -1013.362990202))
            Line((134.000595533, -1013.362990202), (106.419887077, -990))
            Line((106.419887077, -990), (106.419887077, -812.43738))
            ThreePointArc((106.419887077, -812.43738), (103.490954888, -805.366312188), (96.419887077, -802.43738))
            Line((96.419887077, -802.43738), (-66.080112923, -802.43738))
            ThreePointArc((-66.080112923, -802.43738), (-73.151180735, -805.366312188), (-76.080112923, -812.43738))
            Line((-76.080112923, -812.43738), (-76.080112923, -1000))
        make_face()
    extrude(amount=-CUT_EXTRUDE5_DEPTH, mode=Mode.SUBTRACT)


solid = part.part
